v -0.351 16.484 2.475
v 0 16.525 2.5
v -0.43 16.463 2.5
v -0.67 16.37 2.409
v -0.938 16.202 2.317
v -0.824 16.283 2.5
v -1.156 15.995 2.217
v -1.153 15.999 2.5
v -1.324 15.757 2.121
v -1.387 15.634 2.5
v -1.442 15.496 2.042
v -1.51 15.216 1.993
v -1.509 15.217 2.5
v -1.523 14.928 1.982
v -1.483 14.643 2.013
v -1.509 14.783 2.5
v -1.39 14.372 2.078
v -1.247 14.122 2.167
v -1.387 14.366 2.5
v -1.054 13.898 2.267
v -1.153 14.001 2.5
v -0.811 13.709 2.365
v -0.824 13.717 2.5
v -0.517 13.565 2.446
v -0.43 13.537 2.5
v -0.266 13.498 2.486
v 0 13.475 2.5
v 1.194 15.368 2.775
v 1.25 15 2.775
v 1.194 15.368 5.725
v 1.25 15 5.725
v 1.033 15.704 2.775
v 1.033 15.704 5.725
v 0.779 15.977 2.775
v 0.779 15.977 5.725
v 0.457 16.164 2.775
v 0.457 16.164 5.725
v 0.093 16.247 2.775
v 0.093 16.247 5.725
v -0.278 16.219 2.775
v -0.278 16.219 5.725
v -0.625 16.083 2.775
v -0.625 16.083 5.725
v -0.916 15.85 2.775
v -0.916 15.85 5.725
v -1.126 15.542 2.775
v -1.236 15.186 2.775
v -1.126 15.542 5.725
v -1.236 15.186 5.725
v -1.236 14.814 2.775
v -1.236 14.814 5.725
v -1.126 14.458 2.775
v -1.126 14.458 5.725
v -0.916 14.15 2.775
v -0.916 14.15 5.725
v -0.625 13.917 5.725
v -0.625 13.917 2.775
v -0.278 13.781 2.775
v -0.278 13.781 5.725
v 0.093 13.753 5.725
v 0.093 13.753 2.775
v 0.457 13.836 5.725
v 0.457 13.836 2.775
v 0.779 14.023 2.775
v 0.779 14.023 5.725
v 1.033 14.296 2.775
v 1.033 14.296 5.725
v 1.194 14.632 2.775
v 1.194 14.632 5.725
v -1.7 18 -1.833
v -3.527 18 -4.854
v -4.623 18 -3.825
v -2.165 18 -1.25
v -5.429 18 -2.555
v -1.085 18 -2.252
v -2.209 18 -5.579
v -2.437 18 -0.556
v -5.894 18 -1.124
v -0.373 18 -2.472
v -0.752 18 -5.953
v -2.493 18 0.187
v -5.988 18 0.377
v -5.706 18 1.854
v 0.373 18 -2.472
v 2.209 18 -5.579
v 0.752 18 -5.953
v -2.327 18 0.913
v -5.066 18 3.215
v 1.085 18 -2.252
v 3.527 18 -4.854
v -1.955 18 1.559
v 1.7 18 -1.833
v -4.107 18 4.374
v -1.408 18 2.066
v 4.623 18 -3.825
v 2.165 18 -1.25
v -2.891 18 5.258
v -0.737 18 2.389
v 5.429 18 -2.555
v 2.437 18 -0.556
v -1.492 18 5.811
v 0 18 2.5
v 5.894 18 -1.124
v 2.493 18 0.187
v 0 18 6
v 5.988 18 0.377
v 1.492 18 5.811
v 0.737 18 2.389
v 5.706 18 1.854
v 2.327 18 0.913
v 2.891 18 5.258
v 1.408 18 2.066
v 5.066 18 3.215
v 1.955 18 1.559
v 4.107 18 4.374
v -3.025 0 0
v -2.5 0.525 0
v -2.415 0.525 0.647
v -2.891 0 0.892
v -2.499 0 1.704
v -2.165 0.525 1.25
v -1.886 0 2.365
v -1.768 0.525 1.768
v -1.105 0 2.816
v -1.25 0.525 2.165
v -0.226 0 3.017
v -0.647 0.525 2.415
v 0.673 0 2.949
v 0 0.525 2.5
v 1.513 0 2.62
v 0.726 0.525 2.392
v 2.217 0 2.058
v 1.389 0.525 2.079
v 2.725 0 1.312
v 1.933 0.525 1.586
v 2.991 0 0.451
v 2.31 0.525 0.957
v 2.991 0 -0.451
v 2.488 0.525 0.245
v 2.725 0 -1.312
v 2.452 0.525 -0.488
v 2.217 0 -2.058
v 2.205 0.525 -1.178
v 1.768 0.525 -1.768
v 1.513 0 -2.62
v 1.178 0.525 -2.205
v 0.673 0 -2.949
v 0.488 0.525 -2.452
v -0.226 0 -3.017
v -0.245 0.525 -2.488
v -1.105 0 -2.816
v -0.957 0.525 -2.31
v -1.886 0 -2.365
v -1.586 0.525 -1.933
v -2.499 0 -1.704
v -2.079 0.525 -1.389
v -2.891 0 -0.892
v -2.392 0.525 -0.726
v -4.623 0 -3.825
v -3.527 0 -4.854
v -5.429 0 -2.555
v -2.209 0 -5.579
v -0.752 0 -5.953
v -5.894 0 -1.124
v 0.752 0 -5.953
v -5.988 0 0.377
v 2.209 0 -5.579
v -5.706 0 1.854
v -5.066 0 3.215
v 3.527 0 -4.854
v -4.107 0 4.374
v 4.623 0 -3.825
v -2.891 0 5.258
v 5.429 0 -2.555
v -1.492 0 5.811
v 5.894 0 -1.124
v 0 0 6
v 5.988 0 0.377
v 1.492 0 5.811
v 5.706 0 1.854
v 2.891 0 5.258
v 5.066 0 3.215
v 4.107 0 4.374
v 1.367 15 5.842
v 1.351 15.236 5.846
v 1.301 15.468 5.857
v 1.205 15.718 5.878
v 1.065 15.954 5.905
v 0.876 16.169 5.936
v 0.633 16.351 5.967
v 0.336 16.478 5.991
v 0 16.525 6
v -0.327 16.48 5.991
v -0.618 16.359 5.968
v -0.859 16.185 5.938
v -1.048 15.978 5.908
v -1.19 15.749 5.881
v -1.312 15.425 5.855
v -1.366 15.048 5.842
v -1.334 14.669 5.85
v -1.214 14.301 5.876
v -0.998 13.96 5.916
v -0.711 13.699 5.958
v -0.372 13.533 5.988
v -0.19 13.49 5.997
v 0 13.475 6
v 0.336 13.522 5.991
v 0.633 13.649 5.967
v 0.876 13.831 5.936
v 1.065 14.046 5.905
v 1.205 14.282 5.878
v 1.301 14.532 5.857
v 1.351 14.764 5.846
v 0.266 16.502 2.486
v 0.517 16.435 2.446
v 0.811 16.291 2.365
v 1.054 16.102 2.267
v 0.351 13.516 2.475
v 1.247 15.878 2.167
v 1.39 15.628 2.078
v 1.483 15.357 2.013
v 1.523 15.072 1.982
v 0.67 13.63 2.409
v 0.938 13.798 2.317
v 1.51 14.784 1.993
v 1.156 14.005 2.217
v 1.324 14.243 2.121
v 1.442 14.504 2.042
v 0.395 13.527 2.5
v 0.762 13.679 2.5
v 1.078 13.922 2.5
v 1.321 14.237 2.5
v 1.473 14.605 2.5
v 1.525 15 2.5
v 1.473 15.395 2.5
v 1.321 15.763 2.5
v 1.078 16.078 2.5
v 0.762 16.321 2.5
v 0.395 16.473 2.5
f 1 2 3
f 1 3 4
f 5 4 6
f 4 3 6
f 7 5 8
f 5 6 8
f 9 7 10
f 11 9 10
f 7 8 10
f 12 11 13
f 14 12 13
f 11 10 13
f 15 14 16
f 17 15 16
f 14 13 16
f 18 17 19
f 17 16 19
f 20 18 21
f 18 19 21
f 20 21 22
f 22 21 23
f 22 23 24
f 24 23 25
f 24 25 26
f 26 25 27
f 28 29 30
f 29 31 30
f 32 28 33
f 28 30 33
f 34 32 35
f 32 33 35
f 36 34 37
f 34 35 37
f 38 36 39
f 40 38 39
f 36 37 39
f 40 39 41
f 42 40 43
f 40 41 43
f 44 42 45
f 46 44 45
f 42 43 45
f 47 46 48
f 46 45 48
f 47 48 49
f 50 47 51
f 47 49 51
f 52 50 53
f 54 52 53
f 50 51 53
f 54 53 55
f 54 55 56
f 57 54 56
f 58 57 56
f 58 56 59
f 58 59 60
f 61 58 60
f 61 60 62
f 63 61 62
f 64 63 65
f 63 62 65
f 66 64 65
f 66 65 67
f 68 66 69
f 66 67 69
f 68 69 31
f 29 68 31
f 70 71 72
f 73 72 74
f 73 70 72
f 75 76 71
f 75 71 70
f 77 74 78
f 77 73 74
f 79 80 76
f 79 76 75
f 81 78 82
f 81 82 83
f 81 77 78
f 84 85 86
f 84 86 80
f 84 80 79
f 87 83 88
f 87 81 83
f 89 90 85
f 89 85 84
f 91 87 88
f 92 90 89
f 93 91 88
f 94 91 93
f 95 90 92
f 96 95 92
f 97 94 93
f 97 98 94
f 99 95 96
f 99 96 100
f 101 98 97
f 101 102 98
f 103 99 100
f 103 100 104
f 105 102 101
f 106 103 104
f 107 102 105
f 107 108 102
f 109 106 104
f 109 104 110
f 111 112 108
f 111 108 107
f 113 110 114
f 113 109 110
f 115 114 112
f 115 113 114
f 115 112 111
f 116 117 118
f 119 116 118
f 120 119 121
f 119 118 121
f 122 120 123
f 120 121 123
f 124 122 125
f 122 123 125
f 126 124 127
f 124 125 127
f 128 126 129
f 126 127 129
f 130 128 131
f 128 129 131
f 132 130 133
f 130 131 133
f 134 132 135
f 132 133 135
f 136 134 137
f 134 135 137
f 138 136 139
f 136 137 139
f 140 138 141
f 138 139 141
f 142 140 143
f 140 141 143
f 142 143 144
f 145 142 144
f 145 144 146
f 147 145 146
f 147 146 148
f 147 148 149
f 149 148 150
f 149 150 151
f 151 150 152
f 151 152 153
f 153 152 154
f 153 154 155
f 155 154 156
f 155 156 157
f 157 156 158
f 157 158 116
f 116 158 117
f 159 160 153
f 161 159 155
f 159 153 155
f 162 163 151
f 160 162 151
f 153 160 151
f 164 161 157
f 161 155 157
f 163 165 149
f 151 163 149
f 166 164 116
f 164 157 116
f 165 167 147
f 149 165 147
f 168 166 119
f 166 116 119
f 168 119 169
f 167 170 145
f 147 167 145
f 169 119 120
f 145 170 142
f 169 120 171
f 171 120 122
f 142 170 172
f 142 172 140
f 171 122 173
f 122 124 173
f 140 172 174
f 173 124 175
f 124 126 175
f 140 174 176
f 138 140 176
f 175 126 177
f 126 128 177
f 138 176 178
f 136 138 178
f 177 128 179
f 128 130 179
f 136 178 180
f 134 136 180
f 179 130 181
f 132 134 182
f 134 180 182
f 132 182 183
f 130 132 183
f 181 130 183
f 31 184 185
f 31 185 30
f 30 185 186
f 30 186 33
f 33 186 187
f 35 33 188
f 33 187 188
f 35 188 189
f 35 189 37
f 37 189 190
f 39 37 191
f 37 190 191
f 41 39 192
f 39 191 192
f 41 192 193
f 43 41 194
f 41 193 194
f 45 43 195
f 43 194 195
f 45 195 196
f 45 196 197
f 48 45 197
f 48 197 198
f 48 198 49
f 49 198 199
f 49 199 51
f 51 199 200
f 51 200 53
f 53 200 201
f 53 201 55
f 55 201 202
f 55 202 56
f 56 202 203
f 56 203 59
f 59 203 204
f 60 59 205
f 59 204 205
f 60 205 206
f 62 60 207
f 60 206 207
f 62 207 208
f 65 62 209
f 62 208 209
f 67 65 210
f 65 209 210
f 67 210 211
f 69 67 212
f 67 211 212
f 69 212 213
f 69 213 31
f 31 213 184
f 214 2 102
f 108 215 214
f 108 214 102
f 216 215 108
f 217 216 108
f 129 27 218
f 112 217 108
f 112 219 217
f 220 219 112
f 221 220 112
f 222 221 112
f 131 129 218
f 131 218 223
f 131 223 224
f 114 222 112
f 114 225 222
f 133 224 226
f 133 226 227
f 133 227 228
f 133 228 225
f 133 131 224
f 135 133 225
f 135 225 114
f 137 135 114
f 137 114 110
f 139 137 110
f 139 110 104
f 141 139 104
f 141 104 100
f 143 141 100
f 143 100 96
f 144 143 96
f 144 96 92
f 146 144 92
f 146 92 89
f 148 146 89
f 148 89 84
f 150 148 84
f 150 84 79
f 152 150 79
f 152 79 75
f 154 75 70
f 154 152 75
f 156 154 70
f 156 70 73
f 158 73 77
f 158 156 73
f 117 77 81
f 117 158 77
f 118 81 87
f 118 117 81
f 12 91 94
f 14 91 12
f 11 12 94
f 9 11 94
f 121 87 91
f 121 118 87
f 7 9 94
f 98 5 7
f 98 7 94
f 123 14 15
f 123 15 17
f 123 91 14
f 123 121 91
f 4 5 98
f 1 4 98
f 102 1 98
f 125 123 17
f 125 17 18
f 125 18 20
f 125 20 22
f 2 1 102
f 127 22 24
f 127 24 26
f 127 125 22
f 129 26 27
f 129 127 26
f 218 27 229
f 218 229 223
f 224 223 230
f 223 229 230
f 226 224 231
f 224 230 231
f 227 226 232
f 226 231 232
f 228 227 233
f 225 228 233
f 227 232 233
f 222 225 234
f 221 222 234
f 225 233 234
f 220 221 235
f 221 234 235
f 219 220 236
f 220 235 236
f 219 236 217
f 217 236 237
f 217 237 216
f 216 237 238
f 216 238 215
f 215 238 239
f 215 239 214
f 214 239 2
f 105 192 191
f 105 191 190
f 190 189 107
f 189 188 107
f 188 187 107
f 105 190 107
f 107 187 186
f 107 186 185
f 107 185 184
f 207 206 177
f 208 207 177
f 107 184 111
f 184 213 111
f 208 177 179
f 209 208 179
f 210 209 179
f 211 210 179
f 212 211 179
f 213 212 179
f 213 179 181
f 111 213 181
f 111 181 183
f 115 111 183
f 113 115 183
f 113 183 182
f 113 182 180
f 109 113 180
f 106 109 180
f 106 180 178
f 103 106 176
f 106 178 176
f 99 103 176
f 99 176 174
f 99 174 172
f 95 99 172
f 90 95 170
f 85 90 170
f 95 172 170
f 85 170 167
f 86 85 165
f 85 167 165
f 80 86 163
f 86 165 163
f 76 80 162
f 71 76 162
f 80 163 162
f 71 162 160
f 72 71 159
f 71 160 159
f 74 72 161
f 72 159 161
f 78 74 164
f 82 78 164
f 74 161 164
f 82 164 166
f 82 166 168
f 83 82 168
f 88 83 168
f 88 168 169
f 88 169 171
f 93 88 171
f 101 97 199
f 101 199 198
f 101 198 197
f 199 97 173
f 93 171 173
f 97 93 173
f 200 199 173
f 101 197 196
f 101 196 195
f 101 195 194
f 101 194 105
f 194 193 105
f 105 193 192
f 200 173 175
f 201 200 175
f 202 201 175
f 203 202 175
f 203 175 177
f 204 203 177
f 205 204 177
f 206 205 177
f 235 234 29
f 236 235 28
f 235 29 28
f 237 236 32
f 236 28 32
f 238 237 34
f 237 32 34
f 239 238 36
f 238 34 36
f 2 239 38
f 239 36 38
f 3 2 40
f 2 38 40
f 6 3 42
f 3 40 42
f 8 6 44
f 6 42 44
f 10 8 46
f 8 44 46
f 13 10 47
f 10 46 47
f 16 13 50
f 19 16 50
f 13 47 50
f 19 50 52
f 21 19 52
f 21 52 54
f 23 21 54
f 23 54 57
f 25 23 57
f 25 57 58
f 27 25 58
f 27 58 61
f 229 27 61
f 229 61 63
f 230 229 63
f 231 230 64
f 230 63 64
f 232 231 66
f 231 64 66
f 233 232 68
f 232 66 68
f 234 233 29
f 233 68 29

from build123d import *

# Parameters (mm, degrees)
SKETCH1_R                   = 6
SKETCH1_R_2                 = 2.5
BOSS_EXTRUDE1_DEPTH         = 18
M6_TAPPED_HOLE1_D           = 5
M6_TAPPED_HOLE1_DEPTH       = 10
M6_TAPPED_HOLE1_CSINK_D     = 6.05
M6_TAPPED_HOLE1_CSINK_ANGLE = 90
M6_TAPPED_HOLE1_TIP         = 1.502151548


# Read off the part's stored shape, not the designer's step: M3 Tapped Hole1
with BuildPart() as part:
    # Sketch1 → Boss-Extrude1 (new body)
    with BuildSketch(Plane(origin=(0, 0, 0), x_dir=(1, 0, 0), z_dir=(0, 1, 0))):
        with Locations(Location((0, 0, 0), (0, 0, 270))):
            Circle(SKETCH1_R)
        with Locations(Location((0, 0, 0), (0, 0, 270))):
            Circle(SKETCH1_R_2, mode=Mode.SUBTRACT)
    extrude(amount=BOSS_EXTRUDE1_DEPTH)

    # M3 Tapped Hole1 outline → M3 Tapped Hole1 (revolve, cut)
    with BuildSketch(Plane.XZ.offset(-15)):
        Polygon((1.25, 6.000000084), (1.25, 5.725), (1.525000084, 6.000000084), align=None)
        Polygon((1.25, 2.775), (1.25, 5.725), (1.25, 6.000000084), (0, 6.000000084), (0, 1.980737508), (1.25, 1.980737508), align=None)
        Polygon((1.525, 2.5), (1.25, 2.775), (1.25, 1.980737508), (1.525000084, 1.980737508), align=None)
    revolve(axis=Axis((0, 15, 0), (0, 0, 1)), mode=Mode.SUBTRACT)

    # M6 Tapped Hole1
    with Locations(Plane.XZ):
        with Locations((0, 0)):
            CounterSinkHole(M6_TAPPED_HOLE1_D / 2, M6_TAPPED_HOLE1_CSINK_D / 2, depth=M6_TAPPED_HOLE1_DEPTH, counter_sink_angle=M6_TAPPED_HOLE1_CSINK_ANGLE)
            with Locations((0, 0, -(M6_TAPPED_HOLE1_DEPTH + M6_TAPPED_HOLE1_TIP / 2))):  # 118° drill point
                Cone(0, M6_TAPPED_HOLE1_D / 2, M6_TAPPED_HOLE1_TIP, mode=Mode.SUBTRACT)


solid = part.part
